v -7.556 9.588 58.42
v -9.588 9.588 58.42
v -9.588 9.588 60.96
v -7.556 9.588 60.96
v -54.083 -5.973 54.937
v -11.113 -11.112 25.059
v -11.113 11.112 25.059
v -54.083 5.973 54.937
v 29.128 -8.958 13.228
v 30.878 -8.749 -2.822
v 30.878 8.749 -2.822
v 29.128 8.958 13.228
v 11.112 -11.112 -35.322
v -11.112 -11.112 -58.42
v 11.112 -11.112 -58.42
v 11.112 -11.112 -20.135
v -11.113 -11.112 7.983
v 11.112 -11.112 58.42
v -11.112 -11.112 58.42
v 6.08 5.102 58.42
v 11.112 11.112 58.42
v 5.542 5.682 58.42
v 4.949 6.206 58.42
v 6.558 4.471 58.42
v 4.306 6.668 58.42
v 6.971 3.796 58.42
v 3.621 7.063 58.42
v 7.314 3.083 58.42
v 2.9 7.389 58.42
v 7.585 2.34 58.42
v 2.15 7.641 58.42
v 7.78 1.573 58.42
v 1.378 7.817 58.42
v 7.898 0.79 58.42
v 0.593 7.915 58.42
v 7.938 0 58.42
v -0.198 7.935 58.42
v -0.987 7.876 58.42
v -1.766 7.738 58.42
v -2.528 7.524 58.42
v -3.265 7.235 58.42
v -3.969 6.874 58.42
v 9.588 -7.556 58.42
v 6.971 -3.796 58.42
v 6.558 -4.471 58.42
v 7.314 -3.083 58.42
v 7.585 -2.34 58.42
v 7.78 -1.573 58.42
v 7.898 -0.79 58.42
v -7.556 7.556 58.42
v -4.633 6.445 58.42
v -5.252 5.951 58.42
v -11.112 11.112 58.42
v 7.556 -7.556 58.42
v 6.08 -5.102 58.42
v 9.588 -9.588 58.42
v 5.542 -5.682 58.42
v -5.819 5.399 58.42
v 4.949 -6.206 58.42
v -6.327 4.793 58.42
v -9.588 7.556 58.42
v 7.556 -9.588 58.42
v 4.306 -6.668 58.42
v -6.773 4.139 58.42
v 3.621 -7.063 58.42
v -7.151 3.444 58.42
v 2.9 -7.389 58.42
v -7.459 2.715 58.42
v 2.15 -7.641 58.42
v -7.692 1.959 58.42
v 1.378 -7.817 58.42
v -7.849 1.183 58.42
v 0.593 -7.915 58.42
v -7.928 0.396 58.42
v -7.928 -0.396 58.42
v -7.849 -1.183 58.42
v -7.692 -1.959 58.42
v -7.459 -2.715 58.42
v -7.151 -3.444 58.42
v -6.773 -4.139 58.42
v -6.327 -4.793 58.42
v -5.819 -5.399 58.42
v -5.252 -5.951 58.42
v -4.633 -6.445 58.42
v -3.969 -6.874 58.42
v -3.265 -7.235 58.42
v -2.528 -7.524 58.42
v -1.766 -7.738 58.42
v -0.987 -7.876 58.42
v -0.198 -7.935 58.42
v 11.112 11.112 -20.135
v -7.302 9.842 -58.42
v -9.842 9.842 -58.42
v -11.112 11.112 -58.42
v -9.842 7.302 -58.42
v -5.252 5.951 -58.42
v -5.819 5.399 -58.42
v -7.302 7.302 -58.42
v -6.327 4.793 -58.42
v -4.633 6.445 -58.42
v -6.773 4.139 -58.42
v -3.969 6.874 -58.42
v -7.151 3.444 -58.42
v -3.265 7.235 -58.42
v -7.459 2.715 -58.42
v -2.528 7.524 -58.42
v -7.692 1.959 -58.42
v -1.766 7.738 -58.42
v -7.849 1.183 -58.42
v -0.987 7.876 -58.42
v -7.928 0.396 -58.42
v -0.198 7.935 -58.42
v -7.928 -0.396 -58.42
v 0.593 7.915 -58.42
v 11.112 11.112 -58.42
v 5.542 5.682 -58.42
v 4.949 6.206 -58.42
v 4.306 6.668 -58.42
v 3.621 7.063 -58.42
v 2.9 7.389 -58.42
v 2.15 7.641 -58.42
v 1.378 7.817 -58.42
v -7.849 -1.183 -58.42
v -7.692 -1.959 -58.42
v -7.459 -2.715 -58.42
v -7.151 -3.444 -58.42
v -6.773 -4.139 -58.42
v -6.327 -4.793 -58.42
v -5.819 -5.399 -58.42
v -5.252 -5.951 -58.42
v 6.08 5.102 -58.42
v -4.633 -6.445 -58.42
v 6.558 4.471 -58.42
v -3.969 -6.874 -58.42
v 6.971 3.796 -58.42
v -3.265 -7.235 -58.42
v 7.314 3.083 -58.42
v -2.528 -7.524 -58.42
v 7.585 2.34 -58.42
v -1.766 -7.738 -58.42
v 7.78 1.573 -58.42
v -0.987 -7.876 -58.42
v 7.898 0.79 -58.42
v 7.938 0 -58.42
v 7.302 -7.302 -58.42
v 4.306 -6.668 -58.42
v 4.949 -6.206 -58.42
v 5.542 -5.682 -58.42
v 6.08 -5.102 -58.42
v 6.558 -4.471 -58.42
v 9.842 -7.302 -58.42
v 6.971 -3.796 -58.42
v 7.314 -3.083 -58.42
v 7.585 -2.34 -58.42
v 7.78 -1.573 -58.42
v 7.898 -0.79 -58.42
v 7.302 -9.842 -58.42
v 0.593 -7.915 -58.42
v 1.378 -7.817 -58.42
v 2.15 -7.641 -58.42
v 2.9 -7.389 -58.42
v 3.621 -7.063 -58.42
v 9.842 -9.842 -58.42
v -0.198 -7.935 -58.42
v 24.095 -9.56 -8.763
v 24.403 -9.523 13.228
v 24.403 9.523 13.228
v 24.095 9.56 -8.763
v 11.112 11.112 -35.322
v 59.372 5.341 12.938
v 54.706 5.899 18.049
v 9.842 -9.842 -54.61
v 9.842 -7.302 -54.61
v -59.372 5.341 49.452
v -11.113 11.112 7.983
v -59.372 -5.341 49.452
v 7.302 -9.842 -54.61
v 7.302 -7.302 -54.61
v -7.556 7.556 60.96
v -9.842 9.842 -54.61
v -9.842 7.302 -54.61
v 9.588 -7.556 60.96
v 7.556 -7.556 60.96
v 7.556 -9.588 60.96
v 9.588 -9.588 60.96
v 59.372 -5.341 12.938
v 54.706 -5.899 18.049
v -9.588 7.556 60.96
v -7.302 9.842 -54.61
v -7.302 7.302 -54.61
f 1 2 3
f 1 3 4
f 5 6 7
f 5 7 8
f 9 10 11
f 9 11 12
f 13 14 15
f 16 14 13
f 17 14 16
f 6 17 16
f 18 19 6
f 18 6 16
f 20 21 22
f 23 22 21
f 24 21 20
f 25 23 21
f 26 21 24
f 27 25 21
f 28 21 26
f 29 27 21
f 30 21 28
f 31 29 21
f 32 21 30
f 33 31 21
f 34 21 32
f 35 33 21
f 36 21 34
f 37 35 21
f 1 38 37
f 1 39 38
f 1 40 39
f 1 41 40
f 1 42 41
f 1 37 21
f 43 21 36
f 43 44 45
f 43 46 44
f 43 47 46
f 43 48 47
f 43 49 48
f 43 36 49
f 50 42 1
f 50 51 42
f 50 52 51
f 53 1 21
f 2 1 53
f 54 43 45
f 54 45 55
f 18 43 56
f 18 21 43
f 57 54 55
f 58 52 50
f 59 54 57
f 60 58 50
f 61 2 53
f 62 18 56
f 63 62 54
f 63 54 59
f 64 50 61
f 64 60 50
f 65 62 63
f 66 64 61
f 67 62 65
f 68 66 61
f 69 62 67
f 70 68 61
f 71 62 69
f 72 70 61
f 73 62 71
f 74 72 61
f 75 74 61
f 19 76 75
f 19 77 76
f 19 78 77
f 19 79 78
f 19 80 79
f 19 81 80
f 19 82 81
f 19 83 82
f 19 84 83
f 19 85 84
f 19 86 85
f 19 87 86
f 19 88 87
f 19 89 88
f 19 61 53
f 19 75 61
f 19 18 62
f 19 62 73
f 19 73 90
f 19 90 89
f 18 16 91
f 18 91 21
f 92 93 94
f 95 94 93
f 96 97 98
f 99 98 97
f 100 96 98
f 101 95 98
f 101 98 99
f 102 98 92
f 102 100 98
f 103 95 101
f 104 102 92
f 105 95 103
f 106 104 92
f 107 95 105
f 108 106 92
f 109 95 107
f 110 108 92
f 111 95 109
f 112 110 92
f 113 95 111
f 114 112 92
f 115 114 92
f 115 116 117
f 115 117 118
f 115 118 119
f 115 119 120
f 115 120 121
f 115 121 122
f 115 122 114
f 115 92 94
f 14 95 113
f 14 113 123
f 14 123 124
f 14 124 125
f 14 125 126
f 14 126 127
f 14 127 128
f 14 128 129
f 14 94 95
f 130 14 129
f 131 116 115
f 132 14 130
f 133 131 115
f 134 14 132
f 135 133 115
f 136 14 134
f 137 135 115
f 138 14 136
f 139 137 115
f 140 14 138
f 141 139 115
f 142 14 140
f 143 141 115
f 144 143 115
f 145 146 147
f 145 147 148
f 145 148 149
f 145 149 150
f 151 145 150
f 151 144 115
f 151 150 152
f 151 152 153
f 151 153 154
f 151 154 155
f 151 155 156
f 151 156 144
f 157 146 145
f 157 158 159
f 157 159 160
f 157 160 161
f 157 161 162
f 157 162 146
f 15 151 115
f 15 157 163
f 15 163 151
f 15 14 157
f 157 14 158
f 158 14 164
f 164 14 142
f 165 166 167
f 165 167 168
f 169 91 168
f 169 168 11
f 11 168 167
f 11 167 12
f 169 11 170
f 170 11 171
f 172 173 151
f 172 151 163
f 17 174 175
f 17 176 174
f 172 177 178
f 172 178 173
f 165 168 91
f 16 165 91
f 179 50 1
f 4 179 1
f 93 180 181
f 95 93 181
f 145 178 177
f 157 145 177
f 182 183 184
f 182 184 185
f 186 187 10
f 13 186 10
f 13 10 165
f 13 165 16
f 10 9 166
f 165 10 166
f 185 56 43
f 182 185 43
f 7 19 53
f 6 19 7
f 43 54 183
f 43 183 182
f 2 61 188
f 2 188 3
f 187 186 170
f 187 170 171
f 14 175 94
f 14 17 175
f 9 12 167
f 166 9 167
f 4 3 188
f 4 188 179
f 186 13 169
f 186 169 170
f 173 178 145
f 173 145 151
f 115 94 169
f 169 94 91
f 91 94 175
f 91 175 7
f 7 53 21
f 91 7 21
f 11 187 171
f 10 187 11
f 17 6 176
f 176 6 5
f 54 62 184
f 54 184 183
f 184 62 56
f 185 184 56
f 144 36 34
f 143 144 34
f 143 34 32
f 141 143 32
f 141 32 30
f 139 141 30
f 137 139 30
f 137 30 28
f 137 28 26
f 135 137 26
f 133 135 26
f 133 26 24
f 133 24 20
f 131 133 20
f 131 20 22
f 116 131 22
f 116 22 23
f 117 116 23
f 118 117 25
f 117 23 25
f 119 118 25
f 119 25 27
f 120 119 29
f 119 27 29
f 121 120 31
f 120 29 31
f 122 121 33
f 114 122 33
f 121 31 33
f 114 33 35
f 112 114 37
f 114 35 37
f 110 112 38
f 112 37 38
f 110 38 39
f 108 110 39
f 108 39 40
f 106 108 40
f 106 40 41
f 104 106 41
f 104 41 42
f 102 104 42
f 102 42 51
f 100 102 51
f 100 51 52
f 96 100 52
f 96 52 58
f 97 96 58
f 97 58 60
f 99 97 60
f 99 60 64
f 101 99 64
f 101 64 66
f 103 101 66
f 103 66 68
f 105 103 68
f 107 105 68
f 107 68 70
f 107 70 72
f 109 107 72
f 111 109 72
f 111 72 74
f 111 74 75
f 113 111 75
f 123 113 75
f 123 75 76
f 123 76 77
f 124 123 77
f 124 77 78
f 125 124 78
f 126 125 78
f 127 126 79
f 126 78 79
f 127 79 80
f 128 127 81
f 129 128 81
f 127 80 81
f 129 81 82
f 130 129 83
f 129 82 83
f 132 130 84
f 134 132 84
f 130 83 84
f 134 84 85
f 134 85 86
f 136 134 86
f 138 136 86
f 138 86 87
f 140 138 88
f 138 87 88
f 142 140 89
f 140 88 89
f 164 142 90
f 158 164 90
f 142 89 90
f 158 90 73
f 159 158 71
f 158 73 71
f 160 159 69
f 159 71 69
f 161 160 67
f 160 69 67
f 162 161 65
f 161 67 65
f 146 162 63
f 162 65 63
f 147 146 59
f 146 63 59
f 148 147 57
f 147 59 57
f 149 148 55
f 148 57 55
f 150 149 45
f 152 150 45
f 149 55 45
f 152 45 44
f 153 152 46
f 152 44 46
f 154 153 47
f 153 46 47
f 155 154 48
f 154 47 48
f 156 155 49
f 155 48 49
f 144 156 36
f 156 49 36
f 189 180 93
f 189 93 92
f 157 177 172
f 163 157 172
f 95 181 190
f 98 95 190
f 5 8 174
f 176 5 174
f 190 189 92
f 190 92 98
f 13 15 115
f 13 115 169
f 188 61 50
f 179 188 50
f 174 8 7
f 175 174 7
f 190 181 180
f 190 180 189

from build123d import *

# Parameters (mm, degrees)
F1_DEPTH = 11.1125
F2_R     = 7.9375
F3_DEPTH = 133.096
F5_DEPTH = 135.636
F6_W     = 2.54
F6_H     = 2.54
F7_DEPTH = 3.81
F8_W     = 2.032
F8_H     = 2.032
F9_DEPTH = 2.54


with BuildPart() as f1:
    # F0 (on Front) → F1 (new body, symmetric)
    with BuildSketch(Plane.XZ):
        Polygon((-11.1125, -58.42), (11.1125, -58.42), (11.1125, -35.3219639331), (0, -46.4344639331), (0, -29.8688001931), (11.1125, -20.1350393977), (11.1125, 58.42), (-11.1125, 58.42), (-11.1125, 25.0589007236), (0, 17.3320677131), (0, -1.5664904641), (-11.1125, 7.9825179157), align=None)
        Polygon((0, -46.4344639331), (11.1125, -35.3219639331), (11.1125, -20.1350393977), (0, -29.8688001931), align=None)
        Polygon((11.1125, -20.1350393977), (11.1125, -35.3219639331), (59.3725, 12.9380360669), (54.7055751085, 18.0493984371), (30.8782853477, -2.8216151901), (24.0951018289, -8.763202214), align=None)
        Polygon((-59.3725, 49.452497165), (-11.1125, 7.9825179157), (-11.1125, 25.0589007236), (-54.0828680275, 54.9374031437), align=None)
        Polygon((-11.1125, 25.0589007236), (-11.1125, 7.9825179157), (0, -1.5664904641), (0, 17.3320677131), align=None)
        Polygon((24.4025364518, 13.2276853547), (24.0951018289, -8.763202214), (30.8782853477, -2.8216151901), (29.1275199493, 13.2276853547), align=None)
    extrude(amount=F1_DEPTH, both=True)

    # F2 (on face) → F3 (cut)
    with BuildSketch(Plane.XY.offset(58.42)):
        Circle(F2_R)
    extrude(amount=-F3_DEPTH, mode=Mode.SUBTRACT)

    # F4 (on face) → F5 (cut)
    with BuildSketch(Plane.XY.offset(58.42)):
        Polygon((-61.5530486068, -11.1125), (-11.1125, -11.1125), (-61.5530486068, -5.08), align=None)
        Polygon((-61.5530486068, 5.08), (-11.1125, 11.1125), (-61.5530486068, 11.1125), align=None)
        Polygon((61.5530486068, -5.08), (11.1125, -11.1125), (61.5530486068, -11.1125), align=None)
        Polygon((61.5530486068, 11.1125), (11.1125, 11.1125), (61.5530486068, 5.08), align=None)
    extrude(amount=-F5_DEPTH, mode=Mode.SUBTRACT)

    # F6 (on face) → F7 (cut)
    with BuildSketch(Plane(origin=(0, 0, -58.42), x_dir=(1, 0, 0), z_dir=(0, 0, -1))):
        with Locations((8.5725, 8.5725)):
            Rectangle(F6_W, F6_H)
        with Locations((-8.5725, -8.5725)):
            Rectangle(F6_W, F6_H)
    extrude(amount=-F7_DEPTH, mode=Mode.SUBTRACT)

    # F8 (on face) → F9 (join)
    with BuildSketch(Plane.XY.offset(58.42)):
        with Locations((8.5725, -8.5725)):
            Rectangle(F8_W, F8_H)
        with Locations((-8.5725, 8.5725)):
            Rectangle(F8_W, F8_H)
    extrude(amount=F9_DEPTH)


solid = f1.part
